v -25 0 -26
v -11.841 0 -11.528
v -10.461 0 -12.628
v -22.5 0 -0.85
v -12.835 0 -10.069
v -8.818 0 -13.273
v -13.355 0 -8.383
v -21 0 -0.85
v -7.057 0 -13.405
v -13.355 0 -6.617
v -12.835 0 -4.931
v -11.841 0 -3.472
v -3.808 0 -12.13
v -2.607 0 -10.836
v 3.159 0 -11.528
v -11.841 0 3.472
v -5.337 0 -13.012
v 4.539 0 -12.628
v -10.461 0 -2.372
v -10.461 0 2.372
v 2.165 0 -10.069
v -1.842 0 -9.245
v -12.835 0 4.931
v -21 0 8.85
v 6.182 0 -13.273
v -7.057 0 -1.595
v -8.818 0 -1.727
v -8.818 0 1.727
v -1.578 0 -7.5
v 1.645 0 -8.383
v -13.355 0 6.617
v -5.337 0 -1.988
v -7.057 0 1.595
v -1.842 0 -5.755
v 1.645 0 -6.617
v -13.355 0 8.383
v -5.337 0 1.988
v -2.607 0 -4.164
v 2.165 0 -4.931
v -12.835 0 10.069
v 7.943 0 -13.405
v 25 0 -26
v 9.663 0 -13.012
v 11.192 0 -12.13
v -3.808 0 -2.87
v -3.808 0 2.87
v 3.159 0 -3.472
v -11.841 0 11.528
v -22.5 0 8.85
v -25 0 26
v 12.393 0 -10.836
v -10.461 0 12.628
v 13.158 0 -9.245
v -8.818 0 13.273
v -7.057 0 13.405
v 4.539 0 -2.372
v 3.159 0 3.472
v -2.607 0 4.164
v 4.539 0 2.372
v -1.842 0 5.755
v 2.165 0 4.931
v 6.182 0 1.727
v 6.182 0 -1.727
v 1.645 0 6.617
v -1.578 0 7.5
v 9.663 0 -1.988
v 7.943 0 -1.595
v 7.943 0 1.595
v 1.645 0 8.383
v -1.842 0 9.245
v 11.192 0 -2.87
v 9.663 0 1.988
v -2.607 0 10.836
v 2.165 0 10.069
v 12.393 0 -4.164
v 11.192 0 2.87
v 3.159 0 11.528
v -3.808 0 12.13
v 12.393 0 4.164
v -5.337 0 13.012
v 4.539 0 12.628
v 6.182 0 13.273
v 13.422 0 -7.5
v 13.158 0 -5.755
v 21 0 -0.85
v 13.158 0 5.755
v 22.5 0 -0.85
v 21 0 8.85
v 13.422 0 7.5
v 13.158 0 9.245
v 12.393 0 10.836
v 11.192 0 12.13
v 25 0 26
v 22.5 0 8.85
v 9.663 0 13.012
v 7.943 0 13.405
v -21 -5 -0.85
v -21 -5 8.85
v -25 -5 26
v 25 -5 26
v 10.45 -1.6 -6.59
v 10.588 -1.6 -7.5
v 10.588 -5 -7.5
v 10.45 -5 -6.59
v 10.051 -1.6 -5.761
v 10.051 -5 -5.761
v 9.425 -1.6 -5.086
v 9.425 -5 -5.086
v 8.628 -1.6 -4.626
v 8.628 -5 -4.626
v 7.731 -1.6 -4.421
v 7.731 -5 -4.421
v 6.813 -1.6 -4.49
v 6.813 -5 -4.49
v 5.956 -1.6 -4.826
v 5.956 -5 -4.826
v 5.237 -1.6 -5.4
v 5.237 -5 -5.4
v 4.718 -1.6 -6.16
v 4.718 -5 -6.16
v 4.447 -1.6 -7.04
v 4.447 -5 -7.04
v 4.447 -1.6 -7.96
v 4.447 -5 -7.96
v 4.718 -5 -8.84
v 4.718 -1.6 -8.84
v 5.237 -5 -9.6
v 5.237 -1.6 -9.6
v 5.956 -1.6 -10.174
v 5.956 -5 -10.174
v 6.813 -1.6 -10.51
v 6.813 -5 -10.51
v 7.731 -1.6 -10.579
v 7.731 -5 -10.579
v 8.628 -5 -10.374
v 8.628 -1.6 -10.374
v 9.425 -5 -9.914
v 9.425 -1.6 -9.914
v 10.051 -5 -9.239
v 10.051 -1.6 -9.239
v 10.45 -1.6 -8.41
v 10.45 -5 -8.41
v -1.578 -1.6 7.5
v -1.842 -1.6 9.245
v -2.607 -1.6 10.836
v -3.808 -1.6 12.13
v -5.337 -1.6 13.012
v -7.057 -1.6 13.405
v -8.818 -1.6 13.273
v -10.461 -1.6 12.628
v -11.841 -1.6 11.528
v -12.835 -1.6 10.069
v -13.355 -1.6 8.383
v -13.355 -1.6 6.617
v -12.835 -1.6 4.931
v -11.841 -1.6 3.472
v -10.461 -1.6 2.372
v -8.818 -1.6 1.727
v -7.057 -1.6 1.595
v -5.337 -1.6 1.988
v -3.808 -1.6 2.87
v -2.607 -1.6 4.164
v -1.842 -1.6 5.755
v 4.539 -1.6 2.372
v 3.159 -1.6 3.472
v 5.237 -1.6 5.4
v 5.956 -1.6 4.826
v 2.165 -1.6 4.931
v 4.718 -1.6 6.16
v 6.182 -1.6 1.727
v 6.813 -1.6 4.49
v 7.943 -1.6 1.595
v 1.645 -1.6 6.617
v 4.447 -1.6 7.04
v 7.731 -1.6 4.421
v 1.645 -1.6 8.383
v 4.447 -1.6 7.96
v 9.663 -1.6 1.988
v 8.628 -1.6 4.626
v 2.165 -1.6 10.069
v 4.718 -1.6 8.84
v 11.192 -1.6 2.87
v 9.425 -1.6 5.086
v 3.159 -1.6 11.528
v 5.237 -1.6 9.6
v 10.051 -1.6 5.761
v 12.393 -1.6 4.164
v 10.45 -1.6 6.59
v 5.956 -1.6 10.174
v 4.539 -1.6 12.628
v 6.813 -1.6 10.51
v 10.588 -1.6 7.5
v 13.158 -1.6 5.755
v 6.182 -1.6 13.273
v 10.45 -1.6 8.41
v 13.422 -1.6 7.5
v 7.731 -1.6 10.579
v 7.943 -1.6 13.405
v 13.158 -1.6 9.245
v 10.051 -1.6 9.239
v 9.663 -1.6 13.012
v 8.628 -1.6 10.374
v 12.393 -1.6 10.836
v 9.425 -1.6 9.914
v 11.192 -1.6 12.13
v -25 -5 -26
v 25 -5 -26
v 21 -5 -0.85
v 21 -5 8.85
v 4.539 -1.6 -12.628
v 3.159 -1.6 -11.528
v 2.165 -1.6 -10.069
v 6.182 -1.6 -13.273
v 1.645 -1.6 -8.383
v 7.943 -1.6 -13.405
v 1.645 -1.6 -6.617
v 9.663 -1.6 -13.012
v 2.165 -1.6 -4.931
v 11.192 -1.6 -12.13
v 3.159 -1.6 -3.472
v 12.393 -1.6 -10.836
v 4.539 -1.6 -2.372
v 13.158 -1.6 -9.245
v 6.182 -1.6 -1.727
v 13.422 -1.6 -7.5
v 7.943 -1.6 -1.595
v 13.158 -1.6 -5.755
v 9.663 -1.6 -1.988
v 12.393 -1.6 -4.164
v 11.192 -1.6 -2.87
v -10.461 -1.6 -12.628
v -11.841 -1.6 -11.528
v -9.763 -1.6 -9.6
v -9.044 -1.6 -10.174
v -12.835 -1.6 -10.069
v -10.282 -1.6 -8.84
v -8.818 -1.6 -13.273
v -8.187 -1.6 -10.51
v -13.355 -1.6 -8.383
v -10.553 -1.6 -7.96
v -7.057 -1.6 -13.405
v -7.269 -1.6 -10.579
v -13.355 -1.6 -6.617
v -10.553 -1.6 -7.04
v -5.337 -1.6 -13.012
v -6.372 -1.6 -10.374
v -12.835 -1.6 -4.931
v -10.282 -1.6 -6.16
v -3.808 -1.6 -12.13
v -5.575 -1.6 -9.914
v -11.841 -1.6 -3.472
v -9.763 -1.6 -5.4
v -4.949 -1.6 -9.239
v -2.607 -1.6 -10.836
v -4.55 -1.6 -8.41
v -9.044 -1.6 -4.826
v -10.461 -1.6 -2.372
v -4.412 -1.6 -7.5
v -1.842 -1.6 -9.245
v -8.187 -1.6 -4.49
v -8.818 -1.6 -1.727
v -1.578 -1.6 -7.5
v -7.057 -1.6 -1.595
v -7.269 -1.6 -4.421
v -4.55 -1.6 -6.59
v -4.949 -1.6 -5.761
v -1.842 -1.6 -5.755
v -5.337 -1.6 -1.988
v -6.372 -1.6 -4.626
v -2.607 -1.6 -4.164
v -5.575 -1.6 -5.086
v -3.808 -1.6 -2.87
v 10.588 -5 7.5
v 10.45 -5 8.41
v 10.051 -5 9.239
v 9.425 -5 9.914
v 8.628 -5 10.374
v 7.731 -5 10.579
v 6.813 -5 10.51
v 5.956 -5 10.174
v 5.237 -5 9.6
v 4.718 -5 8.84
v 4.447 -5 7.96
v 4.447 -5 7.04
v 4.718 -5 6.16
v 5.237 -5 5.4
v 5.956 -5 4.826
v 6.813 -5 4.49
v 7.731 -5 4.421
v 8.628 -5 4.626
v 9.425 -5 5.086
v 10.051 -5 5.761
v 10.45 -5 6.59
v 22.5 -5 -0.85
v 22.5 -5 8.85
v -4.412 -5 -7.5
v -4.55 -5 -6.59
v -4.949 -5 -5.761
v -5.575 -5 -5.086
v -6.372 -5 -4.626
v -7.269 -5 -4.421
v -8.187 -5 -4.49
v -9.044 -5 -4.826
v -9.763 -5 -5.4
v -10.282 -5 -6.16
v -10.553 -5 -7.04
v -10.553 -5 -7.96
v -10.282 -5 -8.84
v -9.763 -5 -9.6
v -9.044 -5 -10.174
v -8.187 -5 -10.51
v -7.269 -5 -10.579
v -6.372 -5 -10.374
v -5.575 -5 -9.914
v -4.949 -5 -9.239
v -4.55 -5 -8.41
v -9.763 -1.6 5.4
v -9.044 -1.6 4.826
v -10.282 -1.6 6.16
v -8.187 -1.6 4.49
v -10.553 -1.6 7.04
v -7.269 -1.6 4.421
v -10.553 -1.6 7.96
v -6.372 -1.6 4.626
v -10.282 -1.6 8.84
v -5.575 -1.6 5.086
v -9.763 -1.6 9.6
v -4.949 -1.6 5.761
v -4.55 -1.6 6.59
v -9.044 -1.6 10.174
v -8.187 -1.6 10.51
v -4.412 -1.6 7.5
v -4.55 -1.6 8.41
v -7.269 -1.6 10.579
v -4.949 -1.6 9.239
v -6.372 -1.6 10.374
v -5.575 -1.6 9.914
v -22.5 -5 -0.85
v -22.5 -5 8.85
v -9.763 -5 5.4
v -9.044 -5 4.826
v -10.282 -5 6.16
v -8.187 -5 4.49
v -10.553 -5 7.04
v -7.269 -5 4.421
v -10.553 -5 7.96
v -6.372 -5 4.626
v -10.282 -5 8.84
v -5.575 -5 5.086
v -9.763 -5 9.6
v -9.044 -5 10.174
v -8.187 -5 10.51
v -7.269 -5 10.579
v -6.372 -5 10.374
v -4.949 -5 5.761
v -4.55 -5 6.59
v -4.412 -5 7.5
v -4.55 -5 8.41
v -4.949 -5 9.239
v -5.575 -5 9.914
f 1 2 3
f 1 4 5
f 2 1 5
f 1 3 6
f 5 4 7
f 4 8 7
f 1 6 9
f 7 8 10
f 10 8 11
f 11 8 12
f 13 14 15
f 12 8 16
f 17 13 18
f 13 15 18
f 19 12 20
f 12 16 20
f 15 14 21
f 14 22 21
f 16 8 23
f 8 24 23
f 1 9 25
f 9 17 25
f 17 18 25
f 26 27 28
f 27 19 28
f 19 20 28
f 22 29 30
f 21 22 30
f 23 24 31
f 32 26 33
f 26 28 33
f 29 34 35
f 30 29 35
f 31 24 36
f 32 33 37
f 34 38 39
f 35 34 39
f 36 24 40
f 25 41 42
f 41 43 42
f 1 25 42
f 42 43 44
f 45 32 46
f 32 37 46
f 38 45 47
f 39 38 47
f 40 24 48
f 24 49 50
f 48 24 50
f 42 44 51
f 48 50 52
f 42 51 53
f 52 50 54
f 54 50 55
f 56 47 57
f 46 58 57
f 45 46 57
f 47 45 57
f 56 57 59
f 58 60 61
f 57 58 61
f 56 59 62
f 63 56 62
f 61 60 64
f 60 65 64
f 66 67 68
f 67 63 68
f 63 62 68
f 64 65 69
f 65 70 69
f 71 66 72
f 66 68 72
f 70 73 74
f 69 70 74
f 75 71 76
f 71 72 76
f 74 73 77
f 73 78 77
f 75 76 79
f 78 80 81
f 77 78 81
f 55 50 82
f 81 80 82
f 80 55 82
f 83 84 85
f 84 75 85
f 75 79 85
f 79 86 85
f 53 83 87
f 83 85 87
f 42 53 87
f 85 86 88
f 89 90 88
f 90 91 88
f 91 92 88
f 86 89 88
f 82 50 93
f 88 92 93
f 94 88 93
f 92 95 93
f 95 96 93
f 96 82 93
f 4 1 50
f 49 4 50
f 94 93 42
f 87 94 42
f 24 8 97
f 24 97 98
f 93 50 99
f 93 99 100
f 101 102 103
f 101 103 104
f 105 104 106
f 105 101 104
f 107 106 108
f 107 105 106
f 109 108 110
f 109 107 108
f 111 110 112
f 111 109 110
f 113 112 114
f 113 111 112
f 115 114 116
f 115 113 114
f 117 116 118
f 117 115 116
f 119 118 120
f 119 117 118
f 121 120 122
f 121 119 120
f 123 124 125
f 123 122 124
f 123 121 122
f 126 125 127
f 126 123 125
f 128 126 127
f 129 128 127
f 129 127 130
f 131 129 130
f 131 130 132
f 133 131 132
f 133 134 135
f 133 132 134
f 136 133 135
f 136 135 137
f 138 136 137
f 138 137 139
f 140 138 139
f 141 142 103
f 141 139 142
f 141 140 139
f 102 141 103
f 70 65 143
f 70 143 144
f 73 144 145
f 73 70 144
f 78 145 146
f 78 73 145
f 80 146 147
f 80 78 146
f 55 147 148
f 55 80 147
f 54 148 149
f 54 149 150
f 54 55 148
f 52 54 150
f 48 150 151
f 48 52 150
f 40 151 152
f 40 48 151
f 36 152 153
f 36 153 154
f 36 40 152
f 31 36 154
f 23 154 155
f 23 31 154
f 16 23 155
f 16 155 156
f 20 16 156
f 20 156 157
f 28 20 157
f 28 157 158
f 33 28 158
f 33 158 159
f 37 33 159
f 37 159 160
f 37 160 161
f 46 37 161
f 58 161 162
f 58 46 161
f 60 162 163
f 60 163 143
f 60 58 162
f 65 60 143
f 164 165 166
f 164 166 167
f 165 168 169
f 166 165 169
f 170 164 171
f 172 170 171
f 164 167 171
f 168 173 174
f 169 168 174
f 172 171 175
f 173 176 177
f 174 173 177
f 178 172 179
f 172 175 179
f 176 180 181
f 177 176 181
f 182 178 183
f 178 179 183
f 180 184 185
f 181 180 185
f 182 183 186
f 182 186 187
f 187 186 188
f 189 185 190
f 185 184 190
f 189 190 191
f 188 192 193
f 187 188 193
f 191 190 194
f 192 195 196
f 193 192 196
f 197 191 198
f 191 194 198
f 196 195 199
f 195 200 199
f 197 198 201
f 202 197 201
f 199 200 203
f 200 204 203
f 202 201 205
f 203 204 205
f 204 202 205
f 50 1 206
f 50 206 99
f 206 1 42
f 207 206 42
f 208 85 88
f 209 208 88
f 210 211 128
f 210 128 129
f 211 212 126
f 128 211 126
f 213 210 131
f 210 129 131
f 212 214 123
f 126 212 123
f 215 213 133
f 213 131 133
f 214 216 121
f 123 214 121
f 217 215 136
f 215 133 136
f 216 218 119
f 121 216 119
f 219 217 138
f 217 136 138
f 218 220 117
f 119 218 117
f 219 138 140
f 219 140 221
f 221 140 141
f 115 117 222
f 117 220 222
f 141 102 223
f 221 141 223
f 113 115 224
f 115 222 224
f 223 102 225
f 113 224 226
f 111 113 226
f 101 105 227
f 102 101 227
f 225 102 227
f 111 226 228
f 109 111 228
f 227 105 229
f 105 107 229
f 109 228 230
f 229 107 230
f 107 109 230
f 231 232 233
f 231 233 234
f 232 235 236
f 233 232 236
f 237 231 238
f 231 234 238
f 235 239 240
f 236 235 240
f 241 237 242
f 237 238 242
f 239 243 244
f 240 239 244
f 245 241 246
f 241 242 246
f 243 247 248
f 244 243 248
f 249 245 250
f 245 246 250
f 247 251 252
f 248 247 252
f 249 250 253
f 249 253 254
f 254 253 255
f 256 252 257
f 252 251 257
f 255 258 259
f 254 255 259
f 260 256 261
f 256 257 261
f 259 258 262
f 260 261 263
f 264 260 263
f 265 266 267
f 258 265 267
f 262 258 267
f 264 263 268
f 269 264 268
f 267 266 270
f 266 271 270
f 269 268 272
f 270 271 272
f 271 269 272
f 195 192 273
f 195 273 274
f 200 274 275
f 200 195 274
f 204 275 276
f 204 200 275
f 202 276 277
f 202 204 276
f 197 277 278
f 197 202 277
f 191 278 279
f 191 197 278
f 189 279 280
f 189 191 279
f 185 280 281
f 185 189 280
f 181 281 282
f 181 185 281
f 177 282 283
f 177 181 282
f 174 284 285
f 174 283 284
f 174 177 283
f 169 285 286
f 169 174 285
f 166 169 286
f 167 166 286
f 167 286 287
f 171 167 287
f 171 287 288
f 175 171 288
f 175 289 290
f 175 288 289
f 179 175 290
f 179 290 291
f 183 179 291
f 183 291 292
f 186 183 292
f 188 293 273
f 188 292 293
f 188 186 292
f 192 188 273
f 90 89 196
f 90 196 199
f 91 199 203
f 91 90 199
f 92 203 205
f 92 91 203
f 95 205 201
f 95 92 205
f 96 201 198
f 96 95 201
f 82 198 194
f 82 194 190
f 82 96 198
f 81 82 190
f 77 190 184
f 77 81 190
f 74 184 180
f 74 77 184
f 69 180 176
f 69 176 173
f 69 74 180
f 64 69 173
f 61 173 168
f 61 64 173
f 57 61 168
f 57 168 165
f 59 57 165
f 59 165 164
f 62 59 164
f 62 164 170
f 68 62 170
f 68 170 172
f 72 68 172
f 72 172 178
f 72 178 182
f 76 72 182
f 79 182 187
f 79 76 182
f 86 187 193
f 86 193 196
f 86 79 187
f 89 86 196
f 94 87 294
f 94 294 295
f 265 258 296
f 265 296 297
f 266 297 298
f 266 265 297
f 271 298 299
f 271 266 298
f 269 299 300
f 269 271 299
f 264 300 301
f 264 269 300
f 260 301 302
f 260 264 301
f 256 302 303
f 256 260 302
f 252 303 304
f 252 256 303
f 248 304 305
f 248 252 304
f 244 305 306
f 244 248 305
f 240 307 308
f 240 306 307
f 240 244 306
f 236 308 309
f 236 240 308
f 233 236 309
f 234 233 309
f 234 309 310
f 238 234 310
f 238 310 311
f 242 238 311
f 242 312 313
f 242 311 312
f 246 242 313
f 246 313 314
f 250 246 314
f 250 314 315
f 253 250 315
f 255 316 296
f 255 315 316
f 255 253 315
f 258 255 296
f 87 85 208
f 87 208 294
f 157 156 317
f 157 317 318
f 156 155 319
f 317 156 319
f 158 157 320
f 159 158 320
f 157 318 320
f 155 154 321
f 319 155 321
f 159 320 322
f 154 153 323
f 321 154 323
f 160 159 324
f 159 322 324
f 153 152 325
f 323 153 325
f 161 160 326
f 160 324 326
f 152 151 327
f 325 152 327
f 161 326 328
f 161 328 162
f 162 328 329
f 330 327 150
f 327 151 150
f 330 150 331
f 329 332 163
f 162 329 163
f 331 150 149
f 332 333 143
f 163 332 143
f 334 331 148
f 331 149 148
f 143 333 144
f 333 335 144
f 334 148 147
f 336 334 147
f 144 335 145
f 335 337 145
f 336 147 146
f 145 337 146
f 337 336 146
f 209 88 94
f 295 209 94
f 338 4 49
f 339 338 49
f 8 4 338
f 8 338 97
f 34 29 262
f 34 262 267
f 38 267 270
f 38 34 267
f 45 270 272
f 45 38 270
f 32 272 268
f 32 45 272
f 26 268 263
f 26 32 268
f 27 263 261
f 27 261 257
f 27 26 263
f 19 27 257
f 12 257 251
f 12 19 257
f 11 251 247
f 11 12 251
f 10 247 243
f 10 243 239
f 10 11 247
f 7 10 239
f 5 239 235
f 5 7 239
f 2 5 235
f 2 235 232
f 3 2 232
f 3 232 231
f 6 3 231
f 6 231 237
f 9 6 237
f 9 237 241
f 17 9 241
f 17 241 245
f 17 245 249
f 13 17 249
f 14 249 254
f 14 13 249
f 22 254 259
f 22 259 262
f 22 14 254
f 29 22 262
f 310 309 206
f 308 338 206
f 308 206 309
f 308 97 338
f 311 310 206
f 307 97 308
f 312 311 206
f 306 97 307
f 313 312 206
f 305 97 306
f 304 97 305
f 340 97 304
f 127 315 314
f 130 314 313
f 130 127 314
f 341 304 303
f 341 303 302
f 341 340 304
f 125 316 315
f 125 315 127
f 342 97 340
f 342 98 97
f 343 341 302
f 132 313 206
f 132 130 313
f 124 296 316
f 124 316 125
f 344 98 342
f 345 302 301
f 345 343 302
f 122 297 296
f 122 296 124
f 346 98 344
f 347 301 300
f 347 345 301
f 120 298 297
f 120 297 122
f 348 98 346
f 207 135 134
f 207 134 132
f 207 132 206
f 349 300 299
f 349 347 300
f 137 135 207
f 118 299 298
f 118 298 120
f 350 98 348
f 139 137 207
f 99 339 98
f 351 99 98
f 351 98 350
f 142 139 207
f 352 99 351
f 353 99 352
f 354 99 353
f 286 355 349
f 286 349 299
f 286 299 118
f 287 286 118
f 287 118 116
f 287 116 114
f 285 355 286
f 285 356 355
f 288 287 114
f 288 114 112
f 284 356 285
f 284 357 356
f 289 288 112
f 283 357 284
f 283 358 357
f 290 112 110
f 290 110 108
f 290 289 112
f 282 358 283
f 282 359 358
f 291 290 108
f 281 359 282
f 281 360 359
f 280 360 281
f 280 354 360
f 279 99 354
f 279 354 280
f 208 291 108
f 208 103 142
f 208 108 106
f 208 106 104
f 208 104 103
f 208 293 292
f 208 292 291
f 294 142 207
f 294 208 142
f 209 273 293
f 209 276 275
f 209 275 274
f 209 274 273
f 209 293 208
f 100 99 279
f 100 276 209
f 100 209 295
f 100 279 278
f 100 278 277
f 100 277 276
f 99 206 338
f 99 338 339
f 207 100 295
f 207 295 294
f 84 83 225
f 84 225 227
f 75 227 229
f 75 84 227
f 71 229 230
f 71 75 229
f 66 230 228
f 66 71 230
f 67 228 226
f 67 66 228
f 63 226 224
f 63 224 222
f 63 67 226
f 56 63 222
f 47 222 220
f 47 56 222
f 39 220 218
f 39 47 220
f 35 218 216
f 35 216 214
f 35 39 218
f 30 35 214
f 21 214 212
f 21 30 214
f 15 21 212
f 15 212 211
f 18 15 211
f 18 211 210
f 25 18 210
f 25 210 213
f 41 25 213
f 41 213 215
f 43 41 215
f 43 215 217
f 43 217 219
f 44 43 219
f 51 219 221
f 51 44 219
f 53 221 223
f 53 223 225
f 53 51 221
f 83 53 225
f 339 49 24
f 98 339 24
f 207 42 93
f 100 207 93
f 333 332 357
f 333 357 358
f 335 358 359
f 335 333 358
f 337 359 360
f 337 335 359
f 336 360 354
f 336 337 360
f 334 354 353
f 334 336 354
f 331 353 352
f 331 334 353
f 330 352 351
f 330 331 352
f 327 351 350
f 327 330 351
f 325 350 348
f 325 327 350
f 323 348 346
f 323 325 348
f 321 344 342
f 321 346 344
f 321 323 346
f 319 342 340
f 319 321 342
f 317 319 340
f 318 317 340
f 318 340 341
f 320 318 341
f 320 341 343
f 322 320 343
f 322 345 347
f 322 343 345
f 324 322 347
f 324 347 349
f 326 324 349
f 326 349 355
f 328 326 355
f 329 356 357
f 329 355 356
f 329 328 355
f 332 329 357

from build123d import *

# Parameters (mm, degrees)
F0_W     = 50
F0_H     = 52
F0_W_2   = 1.5
F0_H_2   = 9.7
F1_DEPTH = 5
F2_R     = 5.9215
F3_DEPTH = 1.6
F4_R     = 3.0875
F5_DEPTH = 5.001


with BuildPart() as f1:
    # F0 (on Front) → F1 (new body)
    with BuildSketch(Plane.XZ):
        Rectangle(F0_W, F0_H)
        with Locations((-21.75, 4)):
            Rectangle(F0_W_2, F0_H_2, mode=Mode.SUBTRACT)
        with Locations((21.75, 4)):
            Rectangle(F0_W_2, F0_H_2, mode=Mode.SUBTRACT)
    extrude(amount=F1_DEPTH)

    # F2 (on Front) → F3 (cut)
    with BuildSketch(Plane.XZ):
        with Locations((7.5, 7.5)):
            Circle(F2_R)
        with Locations((7.5, -7.5)):
            Circle(F2_R)
        with Locations((-7.5, -7.5)):
            Circle(F2_R)
        with Locations((-7.5, 7.5)):
            Circle(F2_R)
    extrude(amount=F3_DEPTH, mode=Mode.SUBTRACT)

    # F4 (on Front) → F5 (cut, through all)
    with BuildSketch(Plane.XZ):
        with Locations((7.5, 7.5)):
            Circle(F4_R)
        with Locations((-7.5, 7.5)):
            Circle(F4_R)
        with Locations((-7.5, -7.5)):
            Circle(F4_R)
        with Locations((7.5, -7.5)):
            Circle(F4_R)
    extrude(amount=F5_DEPTH, mode=Mode.SUBTRACT)


solid = f1.part
